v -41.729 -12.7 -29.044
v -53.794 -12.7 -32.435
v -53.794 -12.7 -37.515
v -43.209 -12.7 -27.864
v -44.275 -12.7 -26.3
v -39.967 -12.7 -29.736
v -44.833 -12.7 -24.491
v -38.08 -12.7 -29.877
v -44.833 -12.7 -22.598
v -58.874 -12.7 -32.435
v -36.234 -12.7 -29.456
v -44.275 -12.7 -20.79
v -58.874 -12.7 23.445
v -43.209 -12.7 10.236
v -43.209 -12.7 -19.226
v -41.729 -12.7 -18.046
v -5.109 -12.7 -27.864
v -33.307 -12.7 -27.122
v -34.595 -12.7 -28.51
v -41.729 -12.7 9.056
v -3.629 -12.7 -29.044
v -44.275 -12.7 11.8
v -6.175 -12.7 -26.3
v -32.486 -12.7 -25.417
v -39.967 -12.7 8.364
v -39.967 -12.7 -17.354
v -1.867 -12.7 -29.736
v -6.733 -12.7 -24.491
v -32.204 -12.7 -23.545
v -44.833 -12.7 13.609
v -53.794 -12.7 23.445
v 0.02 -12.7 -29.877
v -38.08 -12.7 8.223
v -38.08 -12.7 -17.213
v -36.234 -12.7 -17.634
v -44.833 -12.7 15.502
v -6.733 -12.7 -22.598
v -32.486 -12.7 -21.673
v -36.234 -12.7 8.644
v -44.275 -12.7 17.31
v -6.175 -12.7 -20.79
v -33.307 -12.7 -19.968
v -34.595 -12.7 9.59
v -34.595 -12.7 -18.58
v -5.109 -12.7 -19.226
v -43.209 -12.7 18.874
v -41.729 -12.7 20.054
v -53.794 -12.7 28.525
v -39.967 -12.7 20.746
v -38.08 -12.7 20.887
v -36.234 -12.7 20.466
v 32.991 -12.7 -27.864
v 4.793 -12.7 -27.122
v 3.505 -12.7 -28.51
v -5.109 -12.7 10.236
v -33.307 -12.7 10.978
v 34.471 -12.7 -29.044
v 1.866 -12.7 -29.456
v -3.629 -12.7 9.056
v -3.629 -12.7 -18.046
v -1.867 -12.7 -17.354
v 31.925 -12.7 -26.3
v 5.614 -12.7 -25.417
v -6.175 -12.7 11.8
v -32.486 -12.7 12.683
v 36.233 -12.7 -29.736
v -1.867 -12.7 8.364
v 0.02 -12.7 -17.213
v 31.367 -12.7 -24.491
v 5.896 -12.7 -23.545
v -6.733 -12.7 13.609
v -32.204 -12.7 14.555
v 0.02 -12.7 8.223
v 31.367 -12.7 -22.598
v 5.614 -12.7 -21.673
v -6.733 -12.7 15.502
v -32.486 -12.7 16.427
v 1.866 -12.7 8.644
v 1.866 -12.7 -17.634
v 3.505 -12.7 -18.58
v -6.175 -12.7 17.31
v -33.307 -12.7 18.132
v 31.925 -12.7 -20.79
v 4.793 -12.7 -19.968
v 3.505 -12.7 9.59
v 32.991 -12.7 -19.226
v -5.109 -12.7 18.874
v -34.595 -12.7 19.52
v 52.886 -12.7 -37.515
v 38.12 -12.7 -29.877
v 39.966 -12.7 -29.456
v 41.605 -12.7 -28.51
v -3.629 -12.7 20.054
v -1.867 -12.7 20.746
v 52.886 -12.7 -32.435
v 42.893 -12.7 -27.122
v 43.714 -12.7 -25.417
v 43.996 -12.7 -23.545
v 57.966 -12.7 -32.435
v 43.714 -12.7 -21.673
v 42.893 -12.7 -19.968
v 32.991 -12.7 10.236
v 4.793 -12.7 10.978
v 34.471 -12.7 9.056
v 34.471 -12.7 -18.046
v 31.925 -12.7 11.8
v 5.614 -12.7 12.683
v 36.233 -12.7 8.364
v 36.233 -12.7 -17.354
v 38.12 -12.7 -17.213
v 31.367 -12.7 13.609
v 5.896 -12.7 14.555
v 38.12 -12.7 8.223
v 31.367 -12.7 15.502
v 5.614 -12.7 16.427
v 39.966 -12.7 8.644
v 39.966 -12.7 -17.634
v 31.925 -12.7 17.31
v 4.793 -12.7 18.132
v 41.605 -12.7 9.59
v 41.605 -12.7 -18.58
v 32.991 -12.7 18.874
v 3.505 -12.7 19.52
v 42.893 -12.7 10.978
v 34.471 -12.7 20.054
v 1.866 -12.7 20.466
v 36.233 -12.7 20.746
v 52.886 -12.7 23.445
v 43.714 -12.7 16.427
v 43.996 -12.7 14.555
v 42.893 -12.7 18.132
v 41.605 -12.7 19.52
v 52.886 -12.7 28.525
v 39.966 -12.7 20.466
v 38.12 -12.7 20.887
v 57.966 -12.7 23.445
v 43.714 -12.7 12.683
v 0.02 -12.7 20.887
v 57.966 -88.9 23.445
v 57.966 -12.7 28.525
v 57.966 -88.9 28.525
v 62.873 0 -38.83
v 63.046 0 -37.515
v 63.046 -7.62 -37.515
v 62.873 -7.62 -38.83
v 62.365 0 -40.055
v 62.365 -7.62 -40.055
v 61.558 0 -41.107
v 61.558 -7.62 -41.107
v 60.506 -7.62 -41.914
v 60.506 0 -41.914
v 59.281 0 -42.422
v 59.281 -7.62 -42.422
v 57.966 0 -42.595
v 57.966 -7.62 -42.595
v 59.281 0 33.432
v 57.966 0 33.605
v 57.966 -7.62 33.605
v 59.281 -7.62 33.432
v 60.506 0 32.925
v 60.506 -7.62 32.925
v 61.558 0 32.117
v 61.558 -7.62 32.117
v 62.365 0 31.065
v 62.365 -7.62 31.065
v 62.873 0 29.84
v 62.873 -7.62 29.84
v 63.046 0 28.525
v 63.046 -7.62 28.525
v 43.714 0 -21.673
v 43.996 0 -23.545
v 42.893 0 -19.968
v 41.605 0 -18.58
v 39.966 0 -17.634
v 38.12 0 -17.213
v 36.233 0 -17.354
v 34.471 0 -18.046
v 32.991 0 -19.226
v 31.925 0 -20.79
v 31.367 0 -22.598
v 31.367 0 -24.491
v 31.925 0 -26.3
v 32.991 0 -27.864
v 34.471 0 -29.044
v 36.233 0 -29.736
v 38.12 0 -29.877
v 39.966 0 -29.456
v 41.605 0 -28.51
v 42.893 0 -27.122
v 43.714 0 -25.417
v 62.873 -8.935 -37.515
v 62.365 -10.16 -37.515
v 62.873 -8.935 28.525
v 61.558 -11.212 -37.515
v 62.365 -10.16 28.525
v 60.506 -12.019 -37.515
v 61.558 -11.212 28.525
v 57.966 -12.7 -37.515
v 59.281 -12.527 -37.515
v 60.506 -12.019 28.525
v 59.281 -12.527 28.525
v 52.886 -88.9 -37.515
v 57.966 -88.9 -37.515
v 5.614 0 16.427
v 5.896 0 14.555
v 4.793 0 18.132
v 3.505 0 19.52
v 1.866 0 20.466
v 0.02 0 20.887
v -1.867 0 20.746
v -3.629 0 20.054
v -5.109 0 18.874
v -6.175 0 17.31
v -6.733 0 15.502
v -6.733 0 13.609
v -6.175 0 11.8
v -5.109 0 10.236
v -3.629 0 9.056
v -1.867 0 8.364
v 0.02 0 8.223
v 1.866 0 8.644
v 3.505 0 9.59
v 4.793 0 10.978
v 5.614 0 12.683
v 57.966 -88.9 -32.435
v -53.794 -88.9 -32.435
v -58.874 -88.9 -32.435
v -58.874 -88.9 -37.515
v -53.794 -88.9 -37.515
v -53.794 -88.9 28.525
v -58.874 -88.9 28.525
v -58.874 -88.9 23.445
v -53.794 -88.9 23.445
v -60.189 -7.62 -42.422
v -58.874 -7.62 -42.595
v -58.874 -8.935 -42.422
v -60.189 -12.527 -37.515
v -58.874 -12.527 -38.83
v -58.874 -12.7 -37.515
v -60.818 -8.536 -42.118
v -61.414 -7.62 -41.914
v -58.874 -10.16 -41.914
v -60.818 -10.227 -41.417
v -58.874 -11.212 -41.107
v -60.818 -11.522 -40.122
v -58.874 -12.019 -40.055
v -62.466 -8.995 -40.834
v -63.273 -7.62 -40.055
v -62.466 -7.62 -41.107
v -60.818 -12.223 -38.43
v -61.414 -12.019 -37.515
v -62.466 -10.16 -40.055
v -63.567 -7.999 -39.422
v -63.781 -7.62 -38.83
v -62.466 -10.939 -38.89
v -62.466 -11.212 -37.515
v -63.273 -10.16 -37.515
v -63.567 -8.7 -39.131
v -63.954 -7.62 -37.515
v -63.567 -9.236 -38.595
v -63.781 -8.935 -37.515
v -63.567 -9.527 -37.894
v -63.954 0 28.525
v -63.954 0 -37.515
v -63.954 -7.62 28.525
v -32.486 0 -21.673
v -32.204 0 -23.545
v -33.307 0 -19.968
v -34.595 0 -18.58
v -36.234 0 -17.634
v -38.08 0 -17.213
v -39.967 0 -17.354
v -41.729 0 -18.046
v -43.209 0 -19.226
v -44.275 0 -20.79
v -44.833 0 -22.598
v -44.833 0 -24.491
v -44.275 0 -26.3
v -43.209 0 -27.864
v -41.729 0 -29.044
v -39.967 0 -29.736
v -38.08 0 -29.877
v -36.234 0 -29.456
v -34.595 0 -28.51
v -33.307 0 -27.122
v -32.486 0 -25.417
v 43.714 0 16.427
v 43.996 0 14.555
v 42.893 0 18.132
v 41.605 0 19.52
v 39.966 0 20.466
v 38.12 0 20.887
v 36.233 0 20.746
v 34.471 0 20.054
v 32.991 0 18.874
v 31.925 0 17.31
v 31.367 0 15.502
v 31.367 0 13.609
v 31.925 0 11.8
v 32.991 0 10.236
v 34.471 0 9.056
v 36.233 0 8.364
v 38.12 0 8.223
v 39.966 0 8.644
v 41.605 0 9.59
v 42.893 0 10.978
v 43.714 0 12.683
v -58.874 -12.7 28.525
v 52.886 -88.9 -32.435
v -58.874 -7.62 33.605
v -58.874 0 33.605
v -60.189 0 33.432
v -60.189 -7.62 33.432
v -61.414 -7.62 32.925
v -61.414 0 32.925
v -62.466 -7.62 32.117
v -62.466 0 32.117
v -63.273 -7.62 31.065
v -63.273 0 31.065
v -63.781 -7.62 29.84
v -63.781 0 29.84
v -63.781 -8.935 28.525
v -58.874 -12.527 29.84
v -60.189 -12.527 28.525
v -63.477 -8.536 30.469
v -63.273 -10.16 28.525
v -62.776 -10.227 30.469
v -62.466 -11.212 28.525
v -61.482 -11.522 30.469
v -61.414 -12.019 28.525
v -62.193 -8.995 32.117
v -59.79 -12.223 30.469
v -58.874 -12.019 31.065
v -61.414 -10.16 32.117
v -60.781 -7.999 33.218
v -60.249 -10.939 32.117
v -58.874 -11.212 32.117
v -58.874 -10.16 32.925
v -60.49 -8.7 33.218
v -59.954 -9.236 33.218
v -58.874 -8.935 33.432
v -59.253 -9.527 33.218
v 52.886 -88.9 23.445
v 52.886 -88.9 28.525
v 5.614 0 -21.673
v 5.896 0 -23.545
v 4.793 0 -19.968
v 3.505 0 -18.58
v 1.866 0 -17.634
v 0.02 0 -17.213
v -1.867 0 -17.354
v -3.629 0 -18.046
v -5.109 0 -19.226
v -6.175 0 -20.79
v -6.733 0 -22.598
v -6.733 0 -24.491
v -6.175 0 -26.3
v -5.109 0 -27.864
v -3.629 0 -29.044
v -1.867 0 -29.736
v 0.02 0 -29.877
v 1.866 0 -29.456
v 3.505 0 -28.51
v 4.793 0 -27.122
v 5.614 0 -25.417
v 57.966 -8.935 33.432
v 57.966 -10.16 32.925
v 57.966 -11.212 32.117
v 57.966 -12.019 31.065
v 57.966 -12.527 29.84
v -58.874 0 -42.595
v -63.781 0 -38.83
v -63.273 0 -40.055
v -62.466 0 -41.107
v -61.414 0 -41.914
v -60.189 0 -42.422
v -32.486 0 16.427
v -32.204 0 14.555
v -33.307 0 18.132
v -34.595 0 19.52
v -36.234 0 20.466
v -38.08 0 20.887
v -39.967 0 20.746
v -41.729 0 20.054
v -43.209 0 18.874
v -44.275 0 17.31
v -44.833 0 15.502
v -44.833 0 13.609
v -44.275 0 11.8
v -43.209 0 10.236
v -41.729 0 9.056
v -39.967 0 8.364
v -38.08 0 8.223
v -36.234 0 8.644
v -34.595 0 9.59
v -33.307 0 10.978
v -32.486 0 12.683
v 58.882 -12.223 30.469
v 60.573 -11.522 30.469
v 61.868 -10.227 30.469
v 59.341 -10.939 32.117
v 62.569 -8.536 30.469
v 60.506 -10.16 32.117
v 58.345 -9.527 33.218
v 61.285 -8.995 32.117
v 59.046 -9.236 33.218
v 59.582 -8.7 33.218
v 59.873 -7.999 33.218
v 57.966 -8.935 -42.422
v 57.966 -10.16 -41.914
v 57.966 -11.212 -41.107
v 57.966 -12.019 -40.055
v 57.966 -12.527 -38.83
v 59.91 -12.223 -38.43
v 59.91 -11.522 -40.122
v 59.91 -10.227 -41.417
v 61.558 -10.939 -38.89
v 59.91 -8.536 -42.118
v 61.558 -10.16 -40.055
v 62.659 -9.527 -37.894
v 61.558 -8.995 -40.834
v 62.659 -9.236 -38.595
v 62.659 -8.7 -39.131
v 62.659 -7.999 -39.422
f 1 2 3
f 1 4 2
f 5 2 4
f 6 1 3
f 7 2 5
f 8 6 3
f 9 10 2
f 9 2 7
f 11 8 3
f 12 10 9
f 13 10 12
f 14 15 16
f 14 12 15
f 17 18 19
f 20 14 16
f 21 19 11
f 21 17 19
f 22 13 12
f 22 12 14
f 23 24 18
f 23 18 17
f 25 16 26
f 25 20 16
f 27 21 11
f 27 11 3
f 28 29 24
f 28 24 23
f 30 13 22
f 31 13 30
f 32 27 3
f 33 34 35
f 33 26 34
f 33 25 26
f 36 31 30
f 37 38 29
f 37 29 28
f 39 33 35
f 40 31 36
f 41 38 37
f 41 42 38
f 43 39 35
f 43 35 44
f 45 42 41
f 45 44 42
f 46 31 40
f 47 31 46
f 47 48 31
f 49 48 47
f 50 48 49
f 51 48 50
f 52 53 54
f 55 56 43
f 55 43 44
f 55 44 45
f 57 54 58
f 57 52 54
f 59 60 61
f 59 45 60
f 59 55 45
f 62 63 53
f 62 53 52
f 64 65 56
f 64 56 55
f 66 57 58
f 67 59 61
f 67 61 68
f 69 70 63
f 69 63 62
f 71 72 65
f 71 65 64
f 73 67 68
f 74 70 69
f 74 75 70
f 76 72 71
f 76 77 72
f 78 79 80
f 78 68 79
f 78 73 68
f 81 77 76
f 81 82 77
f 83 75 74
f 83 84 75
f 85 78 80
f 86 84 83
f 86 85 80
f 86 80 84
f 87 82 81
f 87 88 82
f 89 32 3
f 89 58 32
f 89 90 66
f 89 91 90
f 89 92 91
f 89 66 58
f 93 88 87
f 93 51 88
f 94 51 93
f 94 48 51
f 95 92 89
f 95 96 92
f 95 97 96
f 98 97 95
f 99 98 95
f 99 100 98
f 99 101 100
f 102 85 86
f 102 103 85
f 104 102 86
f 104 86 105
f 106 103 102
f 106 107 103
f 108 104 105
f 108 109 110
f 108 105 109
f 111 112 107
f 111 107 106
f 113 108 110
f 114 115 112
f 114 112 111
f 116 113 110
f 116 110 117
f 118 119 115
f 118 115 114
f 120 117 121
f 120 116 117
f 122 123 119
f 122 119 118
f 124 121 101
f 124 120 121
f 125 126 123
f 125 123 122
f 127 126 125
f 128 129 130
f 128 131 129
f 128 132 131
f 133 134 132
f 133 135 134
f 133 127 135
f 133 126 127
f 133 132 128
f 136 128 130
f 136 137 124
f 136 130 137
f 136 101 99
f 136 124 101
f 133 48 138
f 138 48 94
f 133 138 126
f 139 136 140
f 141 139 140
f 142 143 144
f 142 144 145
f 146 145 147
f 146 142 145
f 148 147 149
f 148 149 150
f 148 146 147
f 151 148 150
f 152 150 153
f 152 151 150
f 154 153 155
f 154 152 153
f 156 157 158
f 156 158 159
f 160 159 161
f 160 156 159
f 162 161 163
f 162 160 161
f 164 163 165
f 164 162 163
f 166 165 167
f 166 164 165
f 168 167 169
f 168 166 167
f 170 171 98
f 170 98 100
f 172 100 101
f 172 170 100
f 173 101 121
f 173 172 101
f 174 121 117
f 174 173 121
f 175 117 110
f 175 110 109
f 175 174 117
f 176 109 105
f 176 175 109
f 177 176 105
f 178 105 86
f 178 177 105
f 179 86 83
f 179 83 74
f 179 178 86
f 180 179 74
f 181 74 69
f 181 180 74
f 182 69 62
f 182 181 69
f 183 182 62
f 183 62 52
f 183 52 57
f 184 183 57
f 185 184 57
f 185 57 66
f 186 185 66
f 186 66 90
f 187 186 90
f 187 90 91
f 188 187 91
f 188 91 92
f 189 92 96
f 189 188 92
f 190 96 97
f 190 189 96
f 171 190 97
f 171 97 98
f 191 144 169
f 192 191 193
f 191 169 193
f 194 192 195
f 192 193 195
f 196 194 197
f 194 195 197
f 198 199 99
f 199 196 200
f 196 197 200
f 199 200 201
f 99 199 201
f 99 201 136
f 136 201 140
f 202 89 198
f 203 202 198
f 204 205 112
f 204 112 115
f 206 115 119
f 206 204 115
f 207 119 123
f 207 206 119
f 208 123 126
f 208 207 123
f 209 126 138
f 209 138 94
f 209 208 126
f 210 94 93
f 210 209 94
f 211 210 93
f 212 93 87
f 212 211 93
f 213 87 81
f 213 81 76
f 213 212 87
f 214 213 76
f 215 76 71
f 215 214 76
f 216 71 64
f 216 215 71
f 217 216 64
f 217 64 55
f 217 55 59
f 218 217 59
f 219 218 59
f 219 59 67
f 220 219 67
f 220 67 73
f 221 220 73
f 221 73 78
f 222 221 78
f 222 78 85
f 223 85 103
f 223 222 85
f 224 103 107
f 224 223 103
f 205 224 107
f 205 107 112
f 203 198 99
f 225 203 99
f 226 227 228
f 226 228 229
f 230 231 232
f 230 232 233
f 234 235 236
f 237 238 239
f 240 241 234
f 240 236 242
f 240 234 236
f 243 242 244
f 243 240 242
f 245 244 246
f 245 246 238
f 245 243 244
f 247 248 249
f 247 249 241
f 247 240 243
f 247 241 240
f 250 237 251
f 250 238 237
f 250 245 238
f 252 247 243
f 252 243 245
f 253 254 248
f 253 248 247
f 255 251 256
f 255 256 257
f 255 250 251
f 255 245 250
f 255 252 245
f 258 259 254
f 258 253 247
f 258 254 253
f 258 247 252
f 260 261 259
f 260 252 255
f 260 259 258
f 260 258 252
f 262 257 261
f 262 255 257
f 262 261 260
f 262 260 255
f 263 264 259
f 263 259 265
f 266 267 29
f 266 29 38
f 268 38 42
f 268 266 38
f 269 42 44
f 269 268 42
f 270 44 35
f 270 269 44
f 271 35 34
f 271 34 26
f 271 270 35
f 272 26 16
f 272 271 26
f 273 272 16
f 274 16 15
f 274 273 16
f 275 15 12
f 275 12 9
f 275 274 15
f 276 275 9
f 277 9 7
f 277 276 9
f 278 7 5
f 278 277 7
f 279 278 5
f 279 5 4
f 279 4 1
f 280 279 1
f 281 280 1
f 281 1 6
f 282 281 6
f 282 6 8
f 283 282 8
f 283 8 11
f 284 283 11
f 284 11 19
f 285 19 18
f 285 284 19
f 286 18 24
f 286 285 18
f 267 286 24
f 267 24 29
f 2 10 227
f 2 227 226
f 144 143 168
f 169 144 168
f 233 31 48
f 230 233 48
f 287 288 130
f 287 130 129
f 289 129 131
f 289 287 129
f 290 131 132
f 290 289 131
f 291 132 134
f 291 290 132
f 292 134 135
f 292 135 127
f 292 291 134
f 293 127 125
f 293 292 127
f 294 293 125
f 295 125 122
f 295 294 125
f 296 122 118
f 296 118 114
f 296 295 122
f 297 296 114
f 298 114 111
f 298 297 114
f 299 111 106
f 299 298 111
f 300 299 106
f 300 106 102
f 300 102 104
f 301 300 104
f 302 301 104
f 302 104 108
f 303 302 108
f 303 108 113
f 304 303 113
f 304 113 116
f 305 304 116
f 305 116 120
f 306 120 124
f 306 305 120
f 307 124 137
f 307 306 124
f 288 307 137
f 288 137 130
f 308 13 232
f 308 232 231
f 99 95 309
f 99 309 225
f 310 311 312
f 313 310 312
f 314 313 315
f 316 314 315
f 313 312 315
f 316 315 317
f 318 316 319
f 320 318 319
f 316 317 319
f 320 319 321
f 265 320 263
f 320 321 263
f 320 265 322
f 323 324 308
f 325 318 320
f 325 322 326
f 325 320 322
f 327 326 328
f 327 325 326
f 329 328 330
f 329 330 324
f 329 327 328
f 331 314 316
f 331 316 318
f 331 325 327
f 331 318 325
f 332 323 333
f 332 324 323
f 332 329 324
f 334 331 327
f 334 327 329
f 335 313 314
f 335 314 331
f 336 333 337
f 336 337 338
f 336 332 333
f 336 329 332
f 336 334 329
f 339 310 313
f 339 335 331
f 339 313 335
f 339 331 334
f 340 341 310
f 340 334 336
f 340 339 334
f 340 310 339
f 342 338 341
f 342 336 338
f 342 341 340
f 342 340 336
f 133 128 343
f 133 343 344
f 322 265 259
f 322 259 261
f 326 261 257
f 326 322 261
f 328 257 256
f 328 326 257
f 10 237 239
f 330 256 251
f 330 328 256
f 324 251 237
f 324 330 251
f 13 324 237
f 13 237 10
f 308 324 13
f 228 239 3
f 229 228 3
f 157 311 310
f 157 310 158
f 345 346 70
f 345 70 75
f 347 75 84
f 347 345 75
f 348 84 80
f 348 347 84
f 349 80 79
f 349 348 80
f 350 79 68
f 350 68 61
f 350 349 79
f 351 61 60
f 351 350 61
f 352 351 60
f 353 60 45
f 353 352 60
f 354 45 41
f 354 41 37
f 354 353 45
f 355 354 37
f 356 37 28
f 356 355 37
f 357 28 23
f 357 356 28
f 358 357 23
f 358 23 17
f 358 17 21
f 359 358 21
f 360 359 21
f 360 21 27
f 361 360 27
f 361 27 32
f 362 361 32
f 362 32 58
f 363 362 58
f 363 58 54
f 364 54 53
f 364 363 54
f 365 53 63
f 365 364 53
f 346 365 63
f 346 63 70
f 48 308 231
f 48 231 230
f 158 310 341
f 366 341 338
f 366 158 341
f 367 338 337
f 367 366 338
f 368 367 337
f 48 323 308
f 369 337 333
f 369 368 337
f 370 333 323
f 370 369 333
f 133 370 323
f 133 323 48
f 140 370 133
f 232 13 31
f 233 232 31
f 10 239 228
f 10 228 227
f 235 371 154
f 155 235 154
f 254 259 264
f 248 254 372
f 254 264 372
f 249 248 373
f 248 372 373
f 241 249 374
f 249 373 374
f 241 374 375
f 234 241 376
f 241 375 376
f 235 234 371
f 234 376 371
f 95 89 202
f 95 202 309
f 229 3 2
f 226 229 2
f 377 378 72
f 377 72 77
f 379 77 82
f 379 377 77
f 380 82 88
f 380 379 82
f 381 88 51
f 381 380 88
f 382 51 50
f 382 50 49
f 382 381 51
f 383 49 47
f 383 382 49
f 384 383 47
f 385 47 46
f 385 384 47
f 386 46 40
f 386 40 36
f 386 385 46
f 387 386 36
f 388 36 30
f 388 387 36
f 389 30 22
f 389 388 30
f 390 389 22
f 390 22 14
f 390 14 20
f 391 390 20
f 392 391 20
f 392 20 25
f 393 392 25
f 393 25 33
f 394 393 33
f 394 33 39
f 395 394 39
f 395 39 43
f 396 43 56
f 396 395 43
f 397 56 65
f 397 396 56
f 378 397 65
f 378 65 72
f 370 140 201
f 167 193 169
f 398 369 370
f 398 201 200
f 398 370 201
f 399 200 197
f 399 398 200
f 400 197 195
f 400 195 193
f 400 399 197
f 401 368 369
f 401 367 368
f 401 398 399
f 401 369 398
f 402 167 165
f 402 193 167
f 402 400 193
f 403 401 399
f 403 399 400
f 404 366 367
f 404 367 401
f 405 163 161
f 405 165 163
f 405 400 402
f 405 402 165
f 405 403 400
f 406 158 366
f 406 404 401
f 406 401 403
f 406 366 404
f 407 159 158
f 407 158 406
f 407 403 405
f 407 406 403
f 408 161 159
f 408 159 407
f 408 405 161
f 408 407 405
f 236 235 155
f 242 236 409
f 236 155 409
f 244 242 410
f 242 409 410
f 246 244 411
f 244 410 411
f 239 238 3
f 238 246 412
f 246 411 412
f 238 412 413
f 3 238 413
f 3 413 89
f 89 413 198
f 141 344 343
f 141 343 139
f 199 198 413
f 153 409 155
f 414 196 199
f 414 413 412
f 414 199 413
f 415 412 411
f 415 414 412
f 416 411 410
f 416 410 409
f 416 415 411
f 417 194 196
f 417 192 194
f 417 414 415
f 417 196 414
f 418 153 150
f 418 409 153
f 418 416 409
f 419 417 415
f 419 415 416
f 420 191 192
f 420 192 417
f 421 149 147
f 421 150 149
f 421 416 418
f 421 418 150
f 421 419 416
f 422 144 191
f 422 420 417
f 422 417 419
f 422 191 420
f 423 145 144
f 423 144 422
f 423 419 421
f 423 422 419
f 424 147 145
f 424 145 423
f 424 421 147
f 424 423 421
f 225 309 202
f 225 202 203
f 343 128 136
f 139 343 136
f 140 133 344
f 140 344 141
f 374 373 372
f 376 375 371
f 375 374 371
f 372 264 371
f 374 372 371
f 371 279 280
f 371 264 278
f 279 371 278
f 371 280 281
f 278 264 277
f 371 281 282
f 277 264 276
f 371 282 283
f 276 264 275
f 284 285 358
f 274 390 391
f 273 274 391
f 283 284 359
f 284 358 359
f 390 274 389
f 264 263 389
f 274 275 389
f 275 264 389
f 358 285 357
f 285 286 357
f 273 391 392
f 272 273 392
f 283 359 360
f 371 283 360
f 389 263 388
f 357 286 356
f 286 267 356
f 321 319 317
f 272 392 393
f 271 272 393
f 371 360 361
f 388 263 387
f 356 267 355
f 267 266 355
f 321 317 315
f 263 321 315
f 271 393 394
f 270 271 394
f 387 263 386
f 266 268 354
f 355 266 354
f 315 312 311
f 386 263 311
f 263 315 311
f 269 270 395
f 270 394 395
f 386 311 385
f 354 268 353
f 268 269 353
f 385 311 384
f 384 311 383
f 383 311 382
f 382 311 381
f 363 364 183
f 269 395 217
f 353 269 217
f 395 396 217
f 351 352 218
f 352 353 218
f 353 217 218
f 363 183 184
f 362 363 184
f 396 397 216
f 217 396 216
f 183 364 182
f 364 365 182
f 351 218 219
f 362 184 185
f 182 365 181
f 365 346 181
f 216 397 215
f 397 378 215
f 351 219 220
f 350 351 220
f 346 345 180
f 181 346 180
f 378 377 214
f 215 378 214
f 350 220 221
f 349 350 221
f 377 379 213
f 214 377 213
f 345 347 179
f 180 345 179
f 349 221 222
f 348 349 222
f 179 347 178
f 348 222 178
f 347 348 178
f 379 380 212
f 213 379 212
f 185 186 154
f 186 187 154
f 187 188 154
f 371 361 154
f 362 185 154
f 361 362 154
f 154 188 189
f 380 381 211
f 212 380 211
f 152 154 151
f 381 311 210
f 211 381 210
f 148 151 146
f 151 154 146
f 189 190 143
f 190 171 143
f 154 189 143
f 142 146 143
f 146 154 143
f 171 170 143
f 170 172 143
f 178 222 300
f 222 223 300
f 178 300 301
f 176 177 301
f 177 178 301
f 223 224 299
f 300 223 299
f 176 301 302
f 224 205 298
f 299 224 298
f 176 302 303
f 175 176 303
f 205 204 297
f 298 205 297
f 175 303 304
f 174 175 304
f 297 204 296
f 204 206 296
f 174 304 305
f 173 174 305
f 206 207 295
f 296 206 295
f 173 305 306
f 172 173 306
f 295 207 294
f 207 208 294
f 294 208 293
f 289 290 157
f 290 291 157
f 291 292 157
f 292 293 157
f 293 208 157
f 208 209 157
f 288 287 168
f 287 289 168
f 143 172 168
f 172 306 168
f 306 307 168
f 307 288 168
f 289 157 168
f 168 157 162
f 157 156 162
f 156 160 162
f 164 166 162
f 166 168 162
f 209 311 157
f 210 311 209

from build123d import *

# Parameters (mm, degrees)
F0_W         = 127
F0_H         = 76.2
F0_R         = 6.35
F1_DEPTH     = 12.7
F2_R         = 5.08
F3_T1_DEPTH  = 20.32
F3_S5_W      = 5.08
F3_S5_H      = 5.08
F3_T6_DEPTH  = 5.08
F3_S11_W     = 5.08
F3_S11_H     = 5.08
F3_T12_DEPTH = 5.08
F3_S17_W     = 5.08
F3_S17_H     = 5.08
F3_T18_DEPTH = 5.08
F3_S23_W     = 5.08
F3_S23_H     = 5.08
F3_T24_DEPTH = 5.08
F4_W         = 5.08
F4_H         = 5.08
F5_DEPTH     = 76.2


# Not quite as in the source:
# - a fillet or chamfer that OpenCascade refuses, or shapes differently, is made with other operations: its cross-section is extruded or revolved along the edge and cut away or added


with BuildPart() as f1:
    # F0 (on Front) → F1 (new body)
    with BuildSketch(Plane.XZ):
        with Locations((-0.4540607333, -4.4948741291)):
            Rectangle(F0_W, F0_H)
        with Locations((-38.5540607333, -23.5448741291)):
            Circle(F0_R, mode=Mode.SUBTRACT)
        with Locations((-0.4540607333, -23.5448741291)):
            Circle(F0_R, mode=Mode.SUBTRACT)
        with Locations((37.6459392667, -23.5448741291)):
            Circle(F0_R, mode=Mode.SUBTRACT)
        with Locations((-38.5540607333, 14.5551258709)):
            Circle(F0_R, mode=Mode.SUBTRACT)
        with Locations((-0.4540607333, 14.5551258709)):
            Circle(F0_R, mode=Mode.SUBTRACT)
        with Locations((37.6459392667, 14.5551258709)):
            Circle(F0_R, mode=Mode.SUBTRACT)
    extrude(amount=F1_DEPTH)

    # F2
    f2_edges = [f1.edges().sort_by_distance(p)[0] for p in [
        (-0.454061, -12.7, 33.605126),
        (-63.954061, -12.7, -4.494874),
        (-0.454061, -12.7, -42.594874),
        (63.045939, -12.7, -4.494874),
    ]]
    fillet(f2_edges, radius=F2_R)

    # F3: fillet of radius 5.08 on 4 edges, made by hand

    # F3_s2 → F3_t1 (cut)
    with BuildSketch(Plane.XZ.offset(-12.7)):
        with BuildLine():
            ThreePointArc((-63.9540607333, -37.5148741291), (-62.4661631817, -41.1069765775), (-58.8740607333, -42.5948741291))
            Line((-58.8740607333, -42.5948741291), (-63.9540607333, -42.5948741291))
            Line((-63.9540607333, -42.5948741291), (-63.9540607333, -37.5148741291))
        make_face()
        with BuildLine():
            ThreePointArc((63.0459392667, -37.5148741291), (61.5580417151, -41.1069765775), (57.9659392667, -42.5948741291))
            Line((57.9659392667, -42.5948741291), (63.0459392667, -42.5948741291))
            Line((63.0459392667, -42.5948741291), (63.0459392667, -37.5148741291))
        make_face()
        with BuildLine():
            ThreePointArc((57.9659392667, 33.6051258709), (61.5580417151, 32.1172283193), (63.0459392667, 28.5251258709))
            Line((63.0459392667, 28.5251258709), (63.0459392667, 33.6051258709))
            Line((63.0459392667, 33.6051258709), (57.9659392667, 33.6051258709))
        make_face()
        with BuildLine():
            ThreePointArc((-58.8740607333, 33.6051258709), (-62.4661631817, 32.1172283193), (-63.9540607333, 28.5251258709))
            Line((-63.9540607333, 28.5251258709), (-63.9540607333, 33.6051258709))
            Line((-63.9540607333, 33.6051258709), (-58.8740607333, 33.6051258709))
        make_face()
    extrude(amount=F3_T1_DEPTH, mode=Mode.SUBTRACT)


with BuildPart() as f3_tool4:
    # F3_s5 → F3_t6 (new body)
    with BuildSketch(Plane.XY.offset(28.5251258709)):
        with Locations((-61.4140607333, -10.16)):
            Rectangle(F3_S5_W, F3_S5_H)
    extrude(amount=F3_T6_DEPTH)

    # F3_s7 → F3_t8 (revolve, cut)
    with BuildSketch(Plane(origin=(-58.8740607333, -7.62, 28.5251258709), x_dir=(0.7071067812, 0.7071067812, 0), z_dir=(0.7071067812, -0.7071067812, 0))):
        with BuildLine():
            ThreePointArc((0, -5.08), (5.08, 0), (0, 5.08))
            Line((0, 5.08), (0, -5.08))
        make_face()
    revolve(axis=Axis((-58.8740607333, -7.62, 28.5251258709), (0, 0, 1)), mode=Mode.SUBTRACT)


with BuildPart() as f1_1:
    add(f1.part)

    # F3_t3: cut F3_tool4
    add(f3_tool4.part, mode=Mode.SUBTRACT)


with BuildPart() as f3_tool10:
    # F3_s11 → F3_t12 (new body)
    with BuildSketch(Plane.XY.offset(28.5251258709)):
        with Locations((60.5059392667, -10.16)):
            Rectangle(F3_S11_W, F3_S11_H)
    extrude(amount=F3_T12_DEPTH)

    # F3_s13 → F3_t14 (revolve, cut)
    with BuildSketch(Plane(origin=(57.9659392667, -7.62, 28.5251258709), x_dir=(-0.7071067812, 0.7071067812, 0), z_dir=(0.7071067812, 0.7071067812, 0))):
        with BuildLine():
            ThreePointArc((0, -5.08), (5.08, 0), (0, 5.08))
            Line((0, 5.08), (0, -5.08))
        make_face()
    revolve(axis=Axis((57.9659392667, -7.62, 28.5251258709), (0, 0, 1)), mode=Mode.SUBTRACT)


with BuildPart() as f1_2:
    add(f1_1.part)

    # F3_t9: cut F3_tool10
    add(f3_tool10.part, mode=Mode.SUBTRACT)


with BuildPart() as f3_tool16:
    # F3_s17 → F3_t18 (new body)
    with BuildSketch(Plane.YZ.offset(57.9659392667)):
        with Locations((-10.16, -40.0548741291)):
            Rectangle(F3_S17_W, F3_S17_H)
    extrude(amount=F3_T18_DEPTH)

    # F3_s19 → F3_t20 (revolve, cut)
    with BuildSketch(Plane(origin=(57.9659392667, -7.62, -37.5148741291), x_dir=(0, 0.7071067812, 0.7071067812), z_dir=(0, 0.7071067812, -0.7071067812))):
        with BuildLine():
            ThreePointArc((0, -5.08), (5.08, 0), (0, 5.08))
            Line((0, 5.08), (0, -5.08))
        make_face()
    revolve(axis=Axis((57.9659392667, -7.62, -37.5148741291), (1, 0, 0)), mode=Mode.SUBTRACT)


with BuildPart() as f1_3:
    add(f1_2.part)

    # F3_t15: cut F3_tool16
    add(f3_tool16.part, mode=Mode.SUBTRACT)


with BuildPart() as f3_tool22:
    # F3_s23 → F3_t24 (new body)
    with BuildSketch(Plane.YZ.offset(-58.8740607333)):
        with Locations((-10.16, -40.0548741291)):
            Rectangle(F3_S23_W, F3_S23_H)
    extrude(amount=-F3_T24_DEPTH)

    # F3_s25 → F3_t26 (revolve, cut)
    with BuildSketch(Plane(origin=(-58.8740607333, -7.62, -37.5148741291), x_dir=(0, 0.7071067812, 0.7071067812), z_dir=(0, -0.7071067812, 0.7071067812))):
        with BuildLine():
            ThreePointArc((0, -5.08), (5.08, 0), (0, 5.08))
            Line((0, 5.08), (0, -5.08))
        make_face()
    revolve(axis=Axis((-58.8740607333, -7.62, -37.5148741291), (-1, 0, 0)), mode=Mode.SUBTRACT)


with BuildPart() as f1_4:
    add(f1_3.part)

    # F3_t21: cut F3_tool22
    add(f3_tool22.part, mode=Mode.SUBTRACT)

    # F4 (on face) → F5 (join)
    with BuildSketch(Plane.XZ.offset(12.7)):
        with Locations((-56.3340607333, -34.9748741291)):
            Rectangle(F4_W, F4_H)
        with Locations((55.4259392667, -34.9748741291)):
            Rectangle(F4_W, F4_H)
        with Locations((55.4259392667, 25.9851258709)):
            Rectangle(F4_W, F4_H)
        with Locations((-56.3340607333, 25.9851258709)):
            Rectangle(F4_W, F4_H)
    extrude(amount=F5_DEPTH)


solid = f1_4.part
